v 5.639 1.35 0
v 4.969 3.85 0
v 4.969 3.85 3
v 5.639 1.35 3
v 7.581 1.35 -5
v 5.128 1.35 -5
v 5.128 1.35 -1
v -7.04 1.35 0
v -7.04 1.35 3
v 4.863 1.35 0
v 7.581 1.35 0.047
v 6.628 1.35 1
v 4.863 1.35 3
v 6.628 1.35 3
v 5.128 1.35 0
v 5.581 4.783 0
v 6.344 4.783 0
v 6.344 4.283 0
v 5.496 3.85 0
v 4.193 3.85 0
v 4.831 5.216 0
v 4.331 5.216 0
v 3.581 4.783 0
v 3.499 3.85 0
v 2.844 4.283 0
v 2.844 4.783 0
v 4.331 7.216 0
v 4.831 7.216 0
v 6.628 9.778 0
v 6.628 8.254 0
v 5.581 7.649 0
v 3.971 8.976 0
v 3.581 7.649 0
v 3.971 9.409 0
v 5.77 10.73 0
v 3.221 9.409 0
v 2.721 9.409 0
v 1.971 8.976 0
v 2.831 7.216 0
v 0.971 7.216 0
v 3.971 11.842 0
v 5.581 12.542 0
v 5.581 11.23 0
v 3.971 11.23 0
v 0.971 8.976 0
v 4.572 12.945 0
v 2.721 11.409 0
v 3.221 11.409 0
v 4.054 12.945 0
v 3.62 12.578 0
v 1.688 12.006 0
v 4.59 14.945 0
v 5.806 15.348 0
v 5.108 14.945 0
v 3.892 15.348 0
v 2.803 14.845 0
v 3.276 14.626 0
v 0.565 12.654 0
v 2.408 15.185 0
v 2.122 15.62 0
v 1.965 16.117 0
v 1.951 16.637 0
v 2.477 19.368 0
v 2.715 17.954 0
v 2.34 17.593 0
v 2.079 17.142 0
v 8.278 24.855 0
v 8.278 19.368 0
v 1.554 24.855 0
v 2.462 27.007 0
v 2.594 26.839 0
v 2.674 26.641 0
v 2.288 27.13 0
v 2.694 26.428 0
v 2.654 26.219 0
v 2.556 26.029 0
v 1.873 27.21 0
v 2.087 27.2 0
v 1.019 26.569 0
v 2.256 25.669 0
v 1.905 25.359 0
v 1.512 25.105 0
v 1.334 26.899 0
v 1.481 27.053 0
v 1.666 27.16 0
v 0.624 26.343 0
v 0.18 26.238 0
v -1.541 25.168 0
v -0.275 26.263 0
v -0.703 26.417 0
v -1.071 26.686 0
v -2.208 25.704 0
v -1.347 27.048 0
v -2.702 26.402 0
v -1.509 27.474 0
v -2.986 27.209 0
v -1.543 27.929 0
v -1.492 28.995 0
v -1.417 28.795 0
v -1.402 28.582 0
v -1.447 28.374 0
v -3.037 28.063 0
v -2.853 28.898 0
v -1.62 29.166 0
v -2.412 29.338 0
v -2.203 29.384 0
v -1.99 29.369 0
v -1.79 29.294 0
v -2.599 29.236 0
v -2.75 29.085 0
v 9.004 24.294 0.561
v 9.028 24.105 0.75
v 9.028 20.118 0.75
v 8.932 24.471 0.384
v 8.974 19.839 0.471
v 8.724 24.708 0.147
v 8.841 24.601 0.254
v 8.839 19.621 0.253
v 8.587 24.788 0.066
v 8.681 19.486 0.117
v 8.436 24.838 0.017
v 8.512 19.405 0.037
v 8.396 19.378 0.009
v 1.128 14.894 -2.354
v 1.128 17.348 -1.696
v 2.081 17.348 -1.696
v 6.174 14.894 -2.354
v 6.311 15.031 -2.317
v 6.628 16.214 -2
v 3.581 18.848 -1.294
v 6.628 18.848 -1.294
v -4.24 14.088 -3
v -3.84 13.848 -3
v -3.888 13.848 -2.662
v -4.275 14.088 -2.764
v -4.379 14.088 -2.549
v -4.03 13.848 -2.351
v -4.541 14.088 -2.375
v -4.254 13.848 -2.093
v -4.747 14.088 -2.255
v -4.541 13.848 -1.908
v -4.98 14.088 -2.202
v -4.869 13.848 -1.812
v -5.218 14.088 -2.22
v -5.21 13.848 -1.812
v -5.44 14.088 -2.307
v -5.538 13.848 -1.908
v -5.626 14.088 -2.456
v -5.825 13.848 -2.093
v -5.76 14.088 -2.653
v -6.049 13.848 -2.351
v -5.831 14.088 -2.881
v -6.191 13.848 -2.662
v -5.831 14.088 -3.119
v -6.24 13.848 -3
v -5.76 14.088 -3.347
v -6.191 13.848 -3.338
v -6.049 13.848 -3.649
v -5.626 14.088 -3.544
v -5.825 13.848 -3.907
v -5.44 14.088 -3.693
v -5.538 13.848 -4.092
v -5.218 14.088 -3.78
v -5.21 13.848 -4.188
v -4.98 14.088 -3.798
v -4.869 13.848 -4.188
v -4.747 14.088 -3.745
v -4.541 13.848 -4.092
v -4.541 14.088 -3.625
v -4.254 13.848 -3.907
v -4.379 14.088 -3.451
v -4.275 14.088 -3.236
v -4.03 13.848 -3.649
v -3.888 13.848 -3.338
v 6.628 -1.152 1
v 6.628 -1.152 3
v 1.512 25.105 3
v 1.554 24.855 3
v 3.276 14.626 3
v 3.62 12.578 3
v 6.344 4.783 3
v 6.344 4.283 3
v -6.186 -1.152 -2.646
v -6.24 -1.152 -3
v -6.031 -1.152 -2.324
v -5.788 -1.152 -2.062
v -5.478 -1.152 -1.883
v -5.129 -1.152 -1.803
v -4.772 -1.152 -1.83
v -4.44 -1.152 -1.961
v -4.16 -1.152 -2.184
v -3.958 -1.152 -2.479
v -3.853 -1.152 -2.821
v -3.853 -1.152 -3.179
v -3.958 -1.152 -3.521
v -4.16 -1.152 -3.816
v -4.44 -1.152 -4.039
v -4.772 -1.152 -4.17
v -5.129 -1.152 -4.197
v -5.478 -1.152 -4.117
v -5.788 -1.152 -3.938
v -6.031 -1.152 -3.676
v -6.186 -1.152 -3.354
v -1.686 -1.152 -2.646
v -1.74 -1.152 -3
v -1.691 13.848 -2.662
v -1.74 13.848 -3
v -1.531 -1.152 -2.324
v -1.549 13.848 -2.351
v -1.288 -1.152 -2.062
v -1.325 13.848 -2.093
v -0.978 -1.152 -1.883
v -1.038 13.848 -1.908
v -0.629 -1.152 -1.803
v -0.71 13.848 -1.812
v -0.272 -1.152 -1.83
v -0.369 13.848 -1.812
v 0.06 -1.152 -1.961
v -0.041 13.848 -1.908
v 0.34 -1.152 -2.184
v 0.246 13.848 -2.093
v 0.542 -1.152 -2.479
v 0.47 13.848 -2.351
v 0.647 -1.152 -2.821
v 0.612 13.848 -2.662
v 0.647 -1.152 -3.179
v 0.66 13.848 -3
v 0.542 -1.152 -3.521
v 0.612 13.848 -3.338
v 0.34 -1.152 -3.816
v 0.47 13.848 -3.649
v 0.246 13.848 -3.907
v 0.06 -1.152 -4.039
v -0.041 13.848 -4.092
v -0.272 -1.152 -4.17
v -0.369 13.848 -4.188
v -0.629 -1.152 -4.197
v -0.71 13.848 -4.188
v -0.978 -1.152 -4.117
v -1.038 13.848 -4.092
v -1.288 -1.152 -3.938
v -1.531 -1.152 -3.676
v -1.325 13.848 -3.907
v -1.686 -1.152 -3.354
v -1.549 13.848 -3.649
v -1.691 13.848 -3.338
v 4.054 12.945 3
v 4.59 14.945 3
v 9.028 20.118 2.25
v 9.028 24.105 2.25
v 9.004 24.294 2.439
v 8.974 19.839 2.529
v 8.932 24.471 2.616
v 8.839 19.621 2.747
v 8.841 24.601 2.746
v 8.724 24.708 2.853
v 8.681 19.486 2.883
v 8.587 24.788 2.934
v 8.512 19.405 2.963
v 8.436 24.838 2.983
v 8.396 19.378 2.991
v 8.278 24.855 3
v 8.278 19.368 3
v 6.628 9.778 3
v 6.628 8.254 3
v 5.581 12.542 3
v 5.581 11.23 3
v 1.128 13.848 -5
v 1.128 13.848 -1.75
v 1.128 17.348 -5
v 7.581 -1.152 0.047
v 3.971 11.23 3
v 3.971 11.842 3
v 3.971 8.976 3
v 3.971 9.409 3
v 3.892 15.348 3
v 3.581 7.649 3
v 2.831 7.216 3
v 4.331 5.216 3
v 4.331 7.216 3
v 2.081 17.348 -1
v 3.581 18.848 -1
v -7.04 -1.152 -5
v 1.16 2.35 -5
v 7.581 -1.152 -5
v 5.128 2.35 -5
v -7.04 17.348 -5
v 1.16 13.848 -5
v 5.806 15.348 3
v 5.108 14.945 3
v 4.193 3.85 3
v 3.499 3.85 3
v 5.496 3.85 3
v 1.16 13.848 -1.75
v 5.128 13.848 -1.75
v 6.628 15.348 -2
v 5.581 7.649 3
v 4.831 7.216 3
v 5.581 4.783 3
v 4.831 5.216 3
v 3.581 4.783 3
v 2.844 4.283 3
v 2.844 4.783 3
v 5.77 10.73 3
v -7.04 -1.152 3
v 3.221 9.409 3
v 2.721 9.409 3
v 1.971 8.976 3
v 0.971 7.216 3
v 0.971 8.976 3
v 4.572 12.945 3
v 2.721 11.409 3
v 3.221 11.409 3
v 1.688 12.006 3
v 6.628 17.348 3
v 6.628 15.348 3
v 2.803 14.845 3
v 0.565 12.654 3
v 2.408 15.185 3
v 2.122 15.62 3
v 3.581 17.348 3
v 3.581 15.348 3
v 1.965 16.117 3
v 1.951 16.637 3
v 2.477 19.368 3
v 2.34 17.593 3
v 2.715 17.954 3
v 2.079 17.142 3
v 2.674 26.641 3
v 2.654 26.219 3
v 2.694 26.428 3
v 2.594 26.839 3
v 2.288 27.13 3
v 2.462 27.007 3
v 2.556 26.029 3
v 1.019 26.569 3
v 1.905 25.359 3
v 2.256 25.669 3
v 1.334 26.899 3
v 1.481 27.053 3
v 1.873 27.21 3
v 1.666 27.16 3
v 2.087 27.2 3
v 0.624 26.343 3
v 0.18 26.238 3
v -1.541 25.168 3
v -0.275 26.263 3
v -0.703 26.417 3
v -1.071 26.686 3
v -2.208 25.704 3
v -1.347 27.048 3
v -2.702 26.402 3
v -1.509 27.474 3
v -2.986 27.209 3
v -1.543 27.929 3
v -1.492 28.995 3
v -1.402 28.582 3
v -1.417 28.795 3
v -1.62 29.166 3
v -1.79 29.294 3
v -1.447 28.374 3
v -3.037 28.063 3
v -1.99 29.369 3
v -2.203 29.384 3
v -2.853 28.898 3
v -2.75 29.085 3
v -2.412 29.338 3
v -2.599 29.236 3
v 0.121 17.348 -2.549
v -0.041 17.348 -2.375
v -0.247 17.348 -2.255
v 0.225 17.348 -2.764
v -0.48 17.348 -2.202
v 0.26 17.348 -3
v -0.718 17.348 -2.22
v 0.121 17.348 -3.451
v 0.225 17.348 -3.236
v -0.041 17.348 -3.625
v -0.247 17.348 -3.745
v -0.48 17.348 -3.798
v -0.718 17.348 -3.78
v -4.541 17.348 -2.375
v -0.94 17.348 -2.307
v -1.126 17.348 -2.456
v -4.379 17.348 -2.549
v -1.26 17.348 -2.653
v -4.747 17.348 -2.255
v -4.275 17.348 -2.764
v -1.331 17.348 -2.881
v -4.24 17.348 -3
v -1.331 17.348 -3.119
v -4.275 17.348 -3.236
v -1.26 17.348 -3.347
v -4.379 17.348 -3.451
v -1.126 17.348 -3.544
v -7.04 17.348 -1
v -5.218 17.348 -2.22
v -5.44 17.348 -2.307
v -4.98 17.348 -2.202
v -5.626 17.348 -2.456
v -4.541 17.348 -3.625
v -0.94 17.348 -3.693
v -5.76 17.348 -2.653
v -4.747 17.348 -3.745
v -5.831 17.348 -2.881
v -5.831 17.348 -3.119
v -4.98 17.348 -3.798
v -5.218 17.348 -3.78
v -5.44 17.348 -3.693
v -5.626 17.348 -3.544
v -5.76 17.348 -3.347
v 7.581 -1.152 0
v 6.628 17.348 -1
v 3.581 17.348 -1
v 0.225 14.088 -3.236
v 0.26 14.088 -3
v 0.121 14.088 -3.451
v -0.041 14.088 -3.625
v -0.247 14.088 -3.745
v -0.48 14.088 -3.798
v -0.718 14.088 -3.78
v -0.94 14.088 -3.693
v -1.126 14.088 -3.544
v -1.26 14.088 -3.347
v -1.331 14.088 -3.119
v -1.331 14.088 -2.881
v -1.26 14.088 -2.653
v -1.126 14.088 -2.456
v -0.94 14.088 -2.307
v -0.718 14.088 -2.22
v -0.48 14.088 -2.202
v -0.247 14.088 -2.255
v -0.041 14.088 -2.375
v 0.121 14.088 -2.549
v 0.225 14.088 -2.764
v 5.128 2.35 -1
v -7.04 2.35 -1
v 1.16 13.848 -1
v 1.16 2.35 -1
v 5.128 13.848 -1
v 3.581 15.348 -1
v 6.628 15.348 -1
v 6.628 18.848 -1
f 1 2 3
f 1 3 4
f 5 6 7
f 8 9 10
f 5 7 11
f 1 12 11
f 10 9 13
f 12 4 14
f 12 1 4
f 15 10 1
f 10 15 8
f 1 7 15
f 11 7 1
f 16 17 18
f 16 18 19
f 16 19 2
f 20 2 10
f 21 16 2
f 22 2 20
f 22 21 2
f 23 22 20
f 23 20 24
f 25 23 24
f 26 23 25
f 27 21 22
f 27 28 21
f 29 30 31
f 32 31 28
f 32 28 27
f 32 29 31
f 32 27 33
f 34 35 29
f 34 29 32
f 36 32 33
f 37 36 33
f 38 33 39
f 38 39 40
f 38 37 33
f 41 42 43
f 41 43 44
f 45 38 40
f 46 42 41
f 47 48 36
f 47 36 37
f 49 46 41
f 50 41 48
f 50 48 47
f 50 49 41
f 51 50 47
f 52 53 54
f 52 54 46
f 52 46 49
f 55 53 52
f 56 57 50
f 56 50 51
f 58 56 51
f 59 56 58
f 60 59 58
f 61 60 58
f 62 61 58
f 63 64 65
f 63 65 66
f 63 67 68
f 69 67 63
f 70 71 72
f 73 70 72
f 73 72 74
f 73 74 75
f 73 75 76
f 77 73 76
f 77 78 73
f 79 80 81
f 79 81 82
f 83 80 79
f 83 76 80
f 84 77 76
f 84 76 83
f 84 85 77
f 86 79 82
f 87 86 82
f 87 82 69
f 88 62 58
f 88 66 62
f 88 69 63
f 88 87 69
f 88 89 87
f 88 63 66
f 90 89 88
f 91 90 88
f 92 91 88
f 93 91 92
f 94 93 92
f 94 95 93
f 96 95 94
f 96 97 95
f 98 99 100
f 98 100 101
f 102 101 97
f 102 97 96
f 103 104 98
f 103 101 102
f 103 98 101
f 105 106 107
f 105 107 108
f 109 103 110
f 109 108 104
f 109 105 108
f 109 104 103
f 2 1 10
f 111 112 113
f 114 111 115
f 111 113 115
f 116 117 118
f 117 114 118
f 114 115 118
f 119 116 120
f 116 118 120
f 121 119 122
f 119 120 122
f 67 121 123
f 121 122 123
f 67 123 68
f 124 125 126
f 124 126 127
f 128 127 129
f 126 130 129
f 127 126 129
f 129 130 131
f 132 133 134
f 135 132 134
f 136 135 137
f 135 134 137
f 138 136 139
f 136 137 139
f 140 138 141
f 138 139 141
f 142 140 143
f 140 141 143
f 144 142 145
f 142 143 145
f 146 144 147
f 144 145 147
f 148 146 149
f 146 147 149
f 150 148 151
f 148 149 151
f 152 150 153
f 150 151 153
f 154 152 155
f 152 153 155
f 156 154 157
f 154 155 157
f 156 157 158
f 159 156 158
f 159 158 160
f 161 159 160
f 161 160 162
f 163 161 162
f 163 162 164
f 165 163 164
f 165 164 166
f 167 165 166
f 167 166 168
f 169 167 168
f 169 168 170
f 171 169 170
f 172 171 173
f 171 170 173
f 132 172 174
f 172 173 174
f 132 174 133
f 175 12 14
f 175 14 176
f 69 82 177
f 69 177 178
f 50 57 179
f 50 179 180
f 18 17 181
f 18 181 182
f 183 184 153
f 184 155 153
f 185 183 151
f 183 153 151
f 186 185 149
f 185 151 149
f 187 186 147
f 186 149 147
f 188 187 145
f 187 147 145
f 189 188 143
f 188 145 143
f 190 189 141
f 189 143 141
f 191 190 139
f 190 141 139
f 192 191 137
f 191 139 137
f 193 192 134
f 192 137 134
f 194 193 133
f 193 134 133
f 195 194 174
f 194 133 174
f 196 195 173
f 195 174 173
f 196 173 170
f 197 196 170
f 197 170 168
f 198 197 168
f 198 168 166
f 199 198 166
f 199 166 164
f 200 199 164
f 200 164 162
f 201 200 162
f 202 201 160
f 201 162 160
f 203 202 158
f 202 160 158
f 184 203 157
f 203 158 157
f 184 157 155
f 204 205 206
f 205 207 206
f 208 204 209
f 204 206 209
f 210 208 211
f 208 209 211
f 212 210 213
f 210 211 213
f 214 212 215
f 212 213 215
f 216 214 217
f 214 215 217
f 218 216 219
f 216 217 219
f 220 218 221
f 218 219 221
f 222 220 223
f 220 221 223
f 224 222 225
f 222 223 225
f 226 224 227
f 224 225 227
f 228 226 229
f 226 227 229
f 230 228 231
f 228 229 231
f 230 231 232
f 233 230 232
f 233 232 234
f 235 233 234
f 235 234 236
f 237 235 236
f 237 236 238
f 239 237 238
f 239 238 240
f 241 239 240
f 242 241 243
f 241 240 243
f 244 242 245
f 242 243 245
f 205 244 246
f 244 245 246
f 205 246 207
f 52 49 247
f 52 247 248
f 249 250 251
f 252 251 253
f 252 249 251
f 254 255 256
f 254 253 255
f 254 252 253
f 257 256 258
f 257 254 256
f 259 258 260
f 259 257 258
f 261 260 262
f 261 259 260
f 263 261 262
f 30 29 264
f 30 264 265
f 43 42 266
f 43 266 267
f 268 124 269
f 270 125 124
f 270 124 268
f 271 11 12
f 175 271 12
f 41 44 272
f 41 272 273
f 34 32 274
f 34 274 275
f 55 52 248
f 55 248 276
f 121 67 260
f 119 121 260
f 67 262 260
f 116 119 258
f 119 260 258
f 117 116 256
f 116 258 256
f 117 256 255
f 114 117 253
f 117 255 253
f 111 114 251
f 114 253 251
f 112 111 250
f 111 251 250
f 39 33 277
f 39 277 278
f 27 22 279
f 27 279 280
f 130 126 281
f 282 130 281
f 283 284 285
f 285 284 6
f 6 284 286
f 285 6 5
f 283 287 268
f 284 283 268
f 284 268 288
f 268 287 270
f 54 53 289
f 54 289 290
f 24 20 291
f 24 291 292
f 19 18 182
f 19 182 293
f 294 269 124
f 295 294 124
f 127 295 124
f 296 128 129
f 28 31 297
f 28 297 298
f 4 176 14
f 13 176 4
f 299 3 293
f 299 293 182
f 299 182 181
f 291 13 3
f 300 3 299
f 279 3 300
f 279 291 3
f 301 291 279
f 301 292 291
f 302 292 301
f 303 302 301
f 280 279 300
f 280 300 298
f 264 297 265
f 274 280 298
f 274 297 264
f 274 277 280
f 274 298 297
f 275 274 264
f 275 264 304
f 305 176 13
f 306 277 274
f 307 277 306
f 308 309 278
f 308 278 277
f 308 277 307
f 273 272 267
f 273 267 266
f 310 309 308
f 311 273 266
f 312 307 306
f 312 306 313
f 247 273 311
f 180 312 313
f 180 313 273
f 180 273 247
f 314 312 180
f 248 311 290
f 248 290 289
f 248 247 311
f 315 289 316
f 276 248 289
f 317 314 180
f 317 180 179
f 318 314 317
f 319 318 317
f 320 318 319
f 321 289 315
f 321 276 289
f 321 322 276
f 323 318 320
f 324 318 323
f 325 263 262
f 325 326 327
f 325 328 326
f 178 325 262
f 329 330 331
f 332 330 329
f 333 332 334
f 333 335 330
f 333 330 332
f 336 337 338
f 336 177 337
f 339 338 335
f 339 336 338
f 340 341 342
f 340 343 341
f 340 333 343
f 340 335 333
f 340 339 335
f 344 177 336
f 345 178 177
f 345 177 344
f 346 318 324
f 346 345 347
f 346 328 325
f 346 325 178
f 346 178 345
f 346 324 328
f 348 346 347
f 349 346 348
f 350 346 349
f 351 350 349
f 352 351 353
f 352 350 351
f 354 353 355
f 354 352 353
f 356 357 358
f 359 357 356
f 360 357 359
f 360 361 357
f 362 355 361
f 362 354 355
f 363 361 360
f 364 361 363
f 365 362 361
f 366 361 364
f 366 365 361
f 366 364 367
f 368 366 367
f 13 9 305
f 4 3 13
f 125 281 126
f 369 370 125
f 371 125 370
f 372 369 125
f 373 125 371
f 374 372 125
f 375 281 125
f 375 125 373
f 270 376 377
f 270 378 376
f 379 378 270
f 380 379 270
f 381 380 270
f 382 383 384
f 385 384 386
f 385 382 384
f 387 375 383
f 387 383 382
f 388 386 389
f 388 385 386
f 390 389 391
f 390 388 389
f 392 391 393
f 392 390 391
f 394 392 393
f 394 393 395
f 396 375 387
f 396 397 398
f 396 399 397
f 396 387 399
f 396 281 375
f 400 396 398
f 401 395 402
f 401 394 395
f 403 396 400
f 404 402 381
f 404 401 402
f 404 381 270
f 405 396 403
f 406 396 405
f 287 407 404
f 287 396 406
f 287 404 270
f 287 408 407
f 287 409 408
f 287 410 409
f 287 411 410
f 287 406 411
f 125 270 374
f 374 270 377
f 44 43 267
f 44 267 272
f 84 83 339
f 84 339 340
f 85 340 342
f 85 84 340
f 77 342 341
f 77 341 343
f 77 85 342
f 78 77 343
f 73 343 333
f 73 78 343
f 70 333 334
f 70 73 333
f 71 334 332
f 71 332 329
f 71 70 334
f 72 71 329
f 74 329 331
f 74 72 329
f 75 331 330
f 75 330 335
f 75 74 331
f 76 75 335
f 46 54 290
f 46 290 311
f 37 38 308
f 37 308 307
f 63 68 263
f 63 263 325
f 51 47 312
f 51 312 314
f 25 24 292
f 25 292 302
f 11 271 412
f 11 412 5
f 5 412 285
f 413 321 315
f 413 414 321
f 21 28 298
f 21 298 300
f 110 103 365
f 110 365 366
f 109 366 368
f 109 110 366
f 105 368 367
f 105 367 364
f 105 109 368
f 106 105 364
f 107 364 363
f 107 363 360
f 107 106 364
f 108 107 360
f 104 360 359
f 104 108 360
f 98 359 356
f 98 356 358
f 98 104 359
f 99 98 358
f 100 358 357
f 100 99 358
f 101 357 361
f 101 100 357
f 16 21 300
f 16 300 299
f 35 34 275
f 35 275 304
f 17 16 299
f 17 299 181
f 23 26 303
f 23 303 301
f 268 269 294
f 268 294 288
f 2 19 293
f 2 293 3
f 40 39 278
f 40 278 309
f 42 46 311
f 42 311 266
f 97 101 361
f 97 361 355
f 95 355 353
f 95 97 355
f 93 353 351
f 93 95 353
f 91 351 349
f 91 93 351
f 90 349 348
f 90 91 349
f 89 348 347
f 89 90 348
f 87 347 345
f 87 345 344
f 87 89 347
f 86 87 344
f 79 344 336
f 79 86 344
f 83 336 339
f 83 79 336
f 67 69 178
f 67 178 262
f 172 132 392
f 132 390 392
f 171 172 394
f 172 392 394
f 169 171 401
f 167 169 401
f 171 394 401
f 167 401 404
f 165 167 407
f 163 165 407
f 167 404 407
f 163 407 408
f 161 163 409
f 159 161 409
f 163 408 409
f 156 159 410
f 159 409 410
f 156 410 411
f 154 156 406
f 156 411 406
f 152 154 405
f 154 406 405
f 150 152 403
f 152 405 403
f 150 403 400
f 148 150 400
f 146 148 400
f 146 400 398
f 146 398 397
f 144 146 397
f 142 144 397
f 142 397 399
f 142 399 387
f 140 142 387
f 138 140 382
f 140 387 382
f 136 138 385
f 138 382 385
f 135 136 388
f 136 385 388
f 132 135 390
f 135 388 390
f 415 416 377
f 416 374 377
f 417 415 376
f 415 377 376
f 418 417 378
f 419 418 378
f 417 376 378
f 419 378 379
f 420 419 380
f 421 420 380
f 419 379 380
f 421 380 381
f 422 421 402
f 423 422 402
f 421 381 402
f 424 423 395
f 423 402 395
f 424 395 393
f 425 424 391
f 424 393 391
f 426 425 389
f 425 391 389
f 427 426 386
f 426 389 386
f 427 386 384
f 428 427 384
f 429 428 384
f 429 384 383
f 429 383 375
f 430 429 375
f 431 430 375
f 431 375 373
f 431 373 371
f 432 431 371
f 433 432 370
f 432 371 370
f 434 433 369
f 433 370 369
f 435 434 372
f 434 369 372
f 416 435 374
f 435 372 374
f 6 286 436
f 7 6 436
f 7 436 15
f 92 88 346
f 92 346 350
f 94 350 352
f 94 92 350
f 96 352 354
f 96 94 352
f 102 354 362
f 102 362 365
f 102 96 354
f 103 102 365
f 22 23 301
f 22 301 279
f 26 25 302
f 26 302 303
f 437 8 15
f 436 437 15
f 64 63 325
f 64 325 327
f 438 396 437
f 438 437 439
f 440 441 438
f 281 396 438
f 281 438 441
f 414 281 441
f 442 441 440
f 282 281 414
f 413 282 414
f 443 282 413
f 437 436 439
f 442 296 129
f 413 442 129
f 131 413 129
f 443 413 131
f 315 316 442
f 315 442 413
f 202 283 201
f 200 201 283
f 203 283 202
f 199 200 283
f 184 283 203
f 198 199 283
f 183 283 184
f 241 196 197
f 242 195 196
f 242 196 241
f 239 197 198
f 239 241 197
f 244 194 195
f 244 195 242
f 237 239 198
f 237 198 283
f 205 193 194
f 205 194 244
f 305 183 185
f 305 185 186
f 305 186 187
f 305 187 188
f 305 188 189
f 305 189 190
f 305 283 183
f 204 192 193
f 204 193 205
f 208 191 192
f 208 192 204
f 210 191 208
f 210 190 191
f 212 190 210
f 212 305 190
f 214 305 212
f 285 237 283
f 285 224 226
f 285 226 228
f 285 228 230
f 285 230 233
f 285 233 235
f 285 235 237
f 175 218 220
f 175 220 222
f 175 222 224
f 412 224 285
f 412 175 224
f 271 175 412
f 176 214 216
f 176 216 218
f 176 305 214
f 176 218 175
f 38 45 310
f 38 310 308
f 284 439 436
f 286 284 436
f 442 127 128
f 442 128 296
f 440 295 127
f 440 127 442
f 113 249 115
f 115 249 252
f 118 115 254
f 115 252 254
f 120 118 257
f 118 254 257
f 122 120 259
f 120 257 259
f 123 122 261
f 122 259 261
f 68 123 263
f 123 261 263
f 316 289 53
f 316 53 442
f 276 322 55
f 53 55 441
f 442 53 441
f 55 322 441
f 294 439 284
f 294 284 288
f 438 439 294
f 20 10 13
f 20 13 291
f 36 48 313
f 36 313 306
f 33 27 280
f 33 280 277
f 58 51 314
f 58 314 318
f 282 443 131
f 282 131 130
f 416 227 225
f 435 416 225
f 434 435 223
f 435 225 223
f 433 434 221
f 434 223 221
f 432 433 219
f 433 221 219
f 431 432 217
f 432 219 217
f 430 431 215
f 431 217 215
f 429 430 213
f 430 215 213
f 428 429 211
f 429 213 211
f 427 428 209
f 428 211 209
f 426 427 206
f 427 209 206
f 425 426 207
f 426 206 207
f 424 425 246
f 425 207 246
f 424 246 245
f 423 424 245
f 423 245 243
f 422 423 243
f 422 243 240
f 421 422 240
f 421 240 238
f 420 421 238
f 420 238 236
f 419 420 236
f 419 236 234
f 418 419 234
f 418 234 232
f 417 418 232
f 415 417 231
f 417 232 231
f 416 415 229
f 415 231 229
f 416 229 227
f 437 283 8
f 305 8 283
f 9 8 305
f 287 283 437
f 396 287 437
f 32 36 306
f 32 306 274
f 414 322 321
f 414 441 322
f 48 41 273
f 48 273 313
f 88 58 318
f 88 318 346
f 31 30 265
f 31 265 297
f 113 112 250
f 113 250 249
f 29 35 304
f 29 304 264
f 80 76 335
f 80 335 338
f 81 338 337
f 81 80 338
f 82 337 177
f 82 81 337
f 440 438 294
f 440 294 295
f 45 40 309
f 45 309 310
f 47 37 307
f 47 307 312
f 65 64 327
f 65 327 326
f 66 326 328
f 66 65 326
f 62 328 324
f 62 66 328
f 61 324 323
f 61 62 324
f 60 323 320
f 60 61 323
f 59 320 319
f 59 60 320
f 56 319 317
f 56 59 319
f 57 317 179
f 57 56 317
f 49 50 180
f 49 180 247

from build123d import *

# Parameters (mm, degrees)
BOSS_SWITCH_BODY_DEPTH                    = 3
SKETCH1_W                                 = 4
SKETCH1_H                                 = 3.5
BOSS_FLANGE_WIDTH_DEPTH                   = 5
BOSS_FLANGE_HEIGHT_REACH                  = 35.863
SKETCH2_W                                 = 4
SKETCH2_H                                 = 2
SKETCH2_W_2                               = 8
SKETCH2_H_2                               = 2.502418954
CUT_UP_TO_DOWN_DERAILLEUR_CLEARANCE_REACH = 21.462
SKETCH10_W                                = 2.453096586
SKETCH10_H                                = 3
SKETCH17_W                                = 12.1675
SKETCH17_H                                = 4
BOSS_FLANGE_SUPPORT_DEPTH                 = 13.997581047
TAP_DRILL_FOR_M2X0_4_TAP1_D               = 1.6
M2_CLEARANCE_HOLE2_D                      = 2.4
M2_CLEARANCE_HOLE2_DEPTH                  = 15
M2_CLEARANCE_HOLE2_TIP                    = 0.721032743
CHAMFER_FLANGE_SUPPORT_SIZE               = 1.5
CHAMFER_FLANGE_SUPPORT_2_SIZE             = 1.5
CHAMFER_FLANGE_SUPPORT_3_SIZE             = 1
SKETCH23_W                                = 3.9675
SKETCH23_H                                = 11.497581046
CUT_GAP_FOR_PRINTING_DEPTH                = 32.000499688
SKETCH25_W                                = 0.953096586
SKETCH25_H                                = 3.5
CUT_DERAILLEUR_CLEARANCE_DEPTH            = 32.145320369
CHAMFER8_SIZE                             = 1
CUT_WIDE_DERAILLEUR_CLEARANCE_DEPTH       = 33.195879702
CUT_WIDE_DERAILLEUR_CLEARANCE_DEPTH_BACK  = 4
SKETCH27_W                                = 2.5
SKETCH27_H                                = 5
CHAMFER9_SIZE                             = 4.5
CHAMFER9_SIZE2                            = 1.205771366
SKETCH28_W                                = 3.046903414
SKETCH28_H                                = 1.5
CUT_EXTRUDE1_DEPTH                        = 1
FILLET1_R                                 = 0.75
CHAMFER10_SIZE                            = 0.75
CHAMFER10_SIZE_2                          = 1.299038106


# Some blends are built 0.0001 mm under size
with BuildPart() as part:
    # Sketch-SwitchBossUp → Boss-Switch Body (new body)
    with BuildSketch(Plane.XY):
        with BuildLine():
            Line((5.581091299, 12.541934627), (5.581101009, 11.23008127))
            Line((5.581101009, 11.23008127), (3.971265267, 11.23008127))
            Line((3.971265267, 11.23008127), (3.97126394, 11.842410935))
            Line((3.97126394, 11.842410935), (3.221271341, 11.409402506))
            Line((3.221271341, 11.409402506), (3.221271341, 9.409402506))
            Line((3.221271341, 9.409402506), (3.971278743, 8.976385531))
            Line((3.971278743, 8.976385531), (3.971278743, 9.409408058))
            Line((3.971278743, 9.409408058), (5.770324648, 10.73008127))
            Line((5.770324648, 10.73008127), (6.627976927, 9.777561915))
            Line((6.627976927, 9.777561915), (6.627976927, 8.253837221))
            Line((6.627976927, 8.253837221), (5.581127512, 7.649438429))
            Line((5.581127512, 7.649438429), (4.831138119, 7.216431851))
            Line((4.831138119, 7.216431851), (4.831138119, 5.216431851))
            Line((4.831138119, 5.216431851), (5.58114552, 4.783414875))
            Line((5.58114552, 4.783414875), (6.344074933, 4.783414875))
            Line((6.344074933, 4.783414875), (6.344074933, 4.283414875))
            Line((6.344074933, 4.283414875), (5.495877173, 3.850416844))
            Line((5.495877173, 3.850416844), (4.969366686, 3.850416844))
            Line((4.969366686, 3.850416844), (5.639239667, 1.350416844))
            Line((5.639239667, 1.350416844), (6.627976927, 1.350416844))
            Line((6.627976927, 1.350416844), (6.627976927, -1.15200211))
            Line((6.627976927, -1.15200211), (2.947962105, -1.15200211))
            Line((2.947962105, -1.15200211), (2.947962105, 1.350416844))
            Line((2.947962105, 1.350416844), (4.862782532, 1.350416844))
            Line((4.862782532, 1.350416844), (4.192909551, 3.850416844))
            Line((4.192909551, 3.850416844), (3.498530635, 3.850416844))
            Line((3.498530635, 3.850416844), (2.844074933, 4.283419721))
            Line((2.844074933, 4.283419721), (2.844074933, 4.783419721))
            Line((2.844074933, 4.783419721), (3.58114552, 4.783419721))
            Line((3.58114552, 4.783419721), (4.331138119, 5.21642815))
            Line((4.331138119, 5.21642815), (4.331138119, 7.21642815))
            Line((4.331138119, 7.21642815), (3.581130717, 7.649445125))
            Line((3.581130717, 7.649445125), (2.83112652, 7.216422599))
            Line((2.83112652, 7.216422599), (0.971281948, 7.216422599))
            Line((0.971281948, 7.216422599), (0.971281948, 8.976392227))
            Line((0.971281948, 8.976392227), (1.971281948, 8.976392227))
            Line((1.971281948, 8.976392227), (2.721271341, 9.409398805))
            Line((2.721271341, 9.409398805), (2.721271341, 11.409398805))
            Line((2.721271341, 11.409398805), (1.688483029, 12.005679416))
            Line((1.688483029, 12.005679416), (0.565243661, 12.654181967))
            Line((0.565243661, 12.654181967), (-1.541303694, 25.167805745))
            ThreePointArc((-1.541303694, 25.167805745), (-2.872284003, 26.795385437), (-2.852546321, 28.897797067))
            ThreePointArc((-2.852546321, 28.897797067), (-1.887813913, 29.338582026), (-1.447028953, 28.373849618))
            ThreePointArc((-1.447028953, 28.373849618), (-0.703448682, 26.416936722), (1.333779254, 26.898727173))
            ThreePointArc((1.333779254, 26.898727173), (2.379722745, 27.074801628), (2.555797201, 26.028858137))
            ThreePointArc((2.555797201, 26.028858137), (2.086504637, 25.507104397), (1.511513111, 25.104801997))
            Line((1.511513111, 25.104801997), (1.553598189, 24.854801997))
            Line((1.553598189, 24.854801997), (9.027976927, 24.854801997))
            Line((9.027976927, 24.854801997), (9.027976927, 22.368110011))
            Line((9.027976927, 22.368110011), (9.027976927, 19.368110011))
            Line((9.027976927, 19.368110011), (2.477229641, 19.368110011))
            Line((2.477229641, 19.368110011), (2.715215909, 17.954388823))
            ThreePointArc((2.715215909, 17.954388823), (1.96529156, 16.116657159), (3.275561815, 14.625739302))
            Line((3.275561815, 14.625739302), (3.620297651, 12.577888564))
            Line((3.620297651, 12.577888564), (4.054320079, 12.944956709))
            Line((4.054320079, 12.944956709), (4.59020366, 14.944960676))
            Line((4.59020366, 14.944960676), (3.892110795, 15.34799789))
            Line((3.892110795, 15.34799789), (3.581073513, 15.34799789))
            Line((3.581073513, 15.34799789), (3.581073513, 17.34799789))
            Line((3.581073513, 17.34799789), (5.639078341, 17.34799789))
            Line((5.639078341, 17.34799789), (6.627976927, 17.34799789))
            Line((6.627976927, 17.34799789), (6.627976927, 15.34799789))
            Line((6.627976927, 15.34799789), (5.805904115, 15.34799789))
            Line((5.805904115, 15.34799789), (5.107841751, 14.944964507))
            Line((5.107841751, 14.944964507), (4.571958169, 12.944960541))
            Line((4.571958169, 12.944960541), (5.581091299, 12.541934627))
        make_face()
    extrude(amount=BOSS_SWITCH_BODY_DEPTH)

    # Sketch1 → Boss-Flange Width (add)
    with BuildSketch(Plane(origin=(0, 0, 0), x_dir=(-1, 0, 0), z_dir=(0, 0, -1))):
        Polygon((-7.581073513, -1.15200211), (0.412170615, -1.15200211), (0.412170615, 1.350416844), (-2.947962105, 1.350416844), (-4.862782532, 1.350416844), (-5.639239667, 1.350416844), (-6.627976927, 1.350416844), (-7.581073513, 1.350416844), align=None)
        with Locations((-5.581073513, 17.09799789)):
            Rectangle(SKETCH1_W, SKETCH1_H)
    extrude(amount=BOSS_FLANGE_WIDTH_DEPTH)

    # Sketch2 → Boss-Flange Height (add, up to next)
    with BuildSketch(Plane(origin=(-7.039523073, 0, 0), x_dir=(0, 0, -1), z_dir=(1, 0, 0)), mode=Mode.PRIVATE) as boss_flange_height_sk1:
        with Locations((3, 16.34799789)):
            Rectangle(SKETCH2_W, SKETCH2_H)
    boss_flange_height_tool1 = extrude(boss_flange_height_sk1.sketch, amount=BOSS_FLANGE_HEIGHT_REACH, mode=Mode.PRIVATE) - part.part
    # Sketch2 → Boss-Flange Height (add, up to next)
    with BuildSketch(Plane(origin=(-7.039523073, 0, 0), x_dir=(0, 0, -1), z_dir=(1, 0, 0)), mode=Mode.PRIVATE) as boss_flange_height_sk2:
        with Locations((1, 0.099207367)):
            Rectangle(SKETCH2_W_2, SKETCH2_H_2)
    boss_flange_height_tool2 = extrude(boss_flange_height_sk2.sketch, amount=BOSS_FLANGE_HEIGHT_REACH, mode=Mode.PRIVATE) - part.part
    add(boss_flange_height_tool1.solids().sort_by_distance((-7.039523, 16.347998, -3))[0])
    add(boss_flange_height_tool2.solids().sort_by_distance((-7.039523, 0.099207, -1))[0])

    # Sketch10 → Cut-Up-To-Down Derailleur Clearance (cut, up to next)
    with BuildSketch(Plane(origin=(0, 15.34799789, 0), x_dir=(1, 0, 0), z_dir=(0, 1, 0)), mode=Mode.PRIVATE) as cut_up_to_down_derailleur_clearance_sk1:
        with Locations((6.35452522, 3.5)):
            Rectangle(SKETCH10_W, SKETCH10_H)
    cut_up_to_down_derailleur_clearance_tool1 = extrude(cut_up_to_down_derailleur_clearance_sk1.sketch, amount=CUT_UP_TO_DOWN_DERAILLEUR_CLEARANCE_REACH, mode=Mode.PRIVATE) & part.part
    add(cut_up_to_down_derailleur_clearance_tool1.solids().sort_by_distance((6.354525, 15.347998, -3.5))[0], mode=Mode.SUBTRACT)

    # Sketch17 → Boss-Flange Support (add)
    with BuildSketch(Plane.XZ.offset(-15.34799789)):
        with Locations((-0.955773073, -3)):
            Rectangle(SKETCH17_W, SKETCH17_H)
    extrude(amount=BOSS_FLANGE_SUPPORT_DEPTH)

    # Tap Drill for M2x0.4 Tap1 (through all)
    with Locations(Plane(origin=(0, -1.15200211, 0), x_dir=(-1, 0, 0), z_dir=(0, -1, 0))):
        with Locations((5.039523073, 3), (0.539523073, 3)):
            Hole(TAP_DRILL_FOR_M2X0_4_TAP1_D / 2)

    # M2 Clearance Hole2
    with Locations(Plane.XZ.offset(1.15200211)):
        with Locations((-5.039523073, -3), (-0.539523073, -3)):
            Hole(M2_CLEARANCE_HOLE2_D / 2, depth=M2_CLEARANCE_HOLE2_DEPTH)
            with Locations((0, 0, -(M2_CLEARANCE_HOLE2_DEPTH + M2_CLEARANCE_HOLE2_TIP / 2))):  # 118° drill point
                Cone(0, M2_CLEARANCE_HOLE2_D / 2, M2_CLEARANCE_HOLE2_TIP, mode=Mode.SUBTRACT)

    # Chamfer-Flange Support
    chamfer_flange_support_edges = [part.edges().sort_by_distance(p)[0] for p in [
        (3.581073513, 17.34799789, -3),
    ]]
    chamfer(chamfer_flange_support_edges, length=CHAMFER_FLANGE_SUPPORT_SIZE - 0.0001)  # a hair under: the kernel refuses the full size

    # Chamfer-Flange Support 2
    chamfer_flange_support_2_edges = [part.edges().sort_by_distance(p)[0] for p in [
        (5.127976927, 17.09799789, -2),
        (5.127976927, 15.34799789, -1.5),
    ]]
    chamfer(chamfer_flange_support_2_edges, length=CHAMFER_FLANGE_SUPPORT_2_SIZE)

    # Chamfer-Flange Support 3
    chamfer_flange_support_3_edges = [part.edges().sort_by_distance(p)[0] for p in [
        (-0.955773073, 1.350416843, -1),
    ]]
    chamfer(chamfer_flange_support_3_edges, length=CHAMFER_FLANGE_SUPPORT_3_SIZE - 0.0001)  # a hair under: the kernel refuses the full size

    # Sketch23 → Cut-Gap for Printing (cut, through all)
    with BuildSketch(Plane.XY.offset(-1)):
        with Locations((3.144226927, 8.099207367)):
            Rectangle(SKETCH23_W, SKETCH23_H)
    extrude(amount=-CUT_GAP_FOR_PRINTING_DEPTH, mode=Mode.SUBTRACT)

    # Sketch25 → Cut-Derailleur Clearance (cut, through all)
    with BuildSketch(Plane.XY):
        with Locations((7.10452522, 17.09799789)):
            Rectangle(SKETCH25_W, SKETCH25_H)
    extrude(amount=-CUT_DERAILLEUR_CLEARANCE_DEPTH, mode=Mode.SUBTRACT)

    # Chamfer8
    # the kernel refuses this chamfer: 1 mm, written as the material it adds along each edge
    with BuildSketch(Plane(origin=(6.627976927, 1.350416844, 0), x_dir=(0.9996219169112968, 0, -0.027495876610586365), z_dir=(0, -1, 0))) as chamfer8_piece_1_section:
        Polygon((CHAMFER8_SIZE * 0.999621916911, CHAMFER8_SIZE * 0.0274958766106), (-CHAMFER8_SIZE * 0.0274958766106, CHAMFER8_SIZE * 0.999621916911), (0, 0), align=None)
    chamfer8_piece_1 = extrude(amount=2.502418953, mode=Mode.PRIVATE)
    chamfer8_piece_1 = split(chamfer8_piece_1, bisect_by=Plane(origin=(7.581073513, 0.099207367, 0.332375145), z_dir=(-1, 0, 0)), keep=Keep.TOP, mode=Mode.PRIVATE)
    add(chamfer8_piece_1)

    # Sketch27 → Cut-Wide Derailleur Clearance (cut, two sides: drawn at the far end of the back side and taken through both)
    with BuildSketch(Plane(origin=(5.127976927, 0, 0), x_dir=(0, 0, -1), z_dir=(1, 0, 0)).offset(-CUT_WIDE_DERAILLEUR_CLEARANCE_DEPTH_BACK)):
        with Locations((3.75, 16.34799789)):
            Rectangle(SKETCH27_W, SKETCH27_H)
    extrude(amount=CUT_WIDE_DERAILLEUR_CLEARANCE_DEPTH + CUT_WIDE_DERAILLEUR_CLEARANCE_DEPTH_BACK, mode=Mode.SUBTRACT)

    # Chamfer9
    chamfer9_edges = [part.edges().sort_by_distance(p)[0] for p in [
        (4.85452522, 18.84799789, -2.5),
    ]]
    chamfer9_side = [part.faces().sort_by_distance(p)[0] for p in [
        (3.764105521, 16.180817512, -2.5),
    ]]
    chamfer(chamfer9_edges, length=CHAMFER9_SIZE, length2=CHAMFER9_SIZE2, reference=chamfer9_side[0])

    # Sketch28 → Cut-Extrude1 (cut)
    with BuildSketch(Plane.XY.offset(-1)):
        with Locations((5.10452522, 18.09799789)):
            Rectangle(SKETCH28_W, SKETCH28_H)
    extrude(amount=CUT_EXTRUDE1_DEPTH, mode=Mode.SUBTRACT)

    # Fillet1
    fillet1_edges = [part.edges().sort_by_distance(p)[0] for p in [
        (9.027976927, 24.854801997, 1.5),
        (9.027976927, 19.368110011, 1.5),
        (9.027976927, 22.111456004, 3),
        (9.027976927, 22.111456004, 0),
    ]]
    fillet(fillet1_edges, radius=FILLET1_R)

    # Chamfer10
    # the kernel refuses this chamfer: 1.299038106, 0.75 mm, written as the material it takes off along each edge
    with BuildSketch(Plane(origin=(-2.200246051, 13.84799789, -2.5), x_dir=(0, -0.0578938624026709, 0.9983227437537926), z_dir=(1, 0, 0))) as chamfer10_piece_1_section:
        Polygon((CHAMFER10_SIZE * 0.998322743754, -CHAMFER10_SIZE * 0.0578938624027), (-CHAMFER10_SIZE_2 * 0.0578938623883, -CHAMFER10_SIZE_2 * 0.998322743505), (0, 0), align=None)
    chamfer10_piece_1 = extrude(amount=10.688945956, mode=Mode.PRIVATE)
    chamfer10_piece_1 = split(chamfer10_piece_1, bisect_by=Plane(origin=(1.127976927, 14.210794695, -2.222573912), z_dir=(1, 0, 0)), keep=Keep.TOP, mode=Mode.PRIVATE)
    add(chamfer10_piece_1, mode=Mode.SUBTRACT)


solid = part.part
